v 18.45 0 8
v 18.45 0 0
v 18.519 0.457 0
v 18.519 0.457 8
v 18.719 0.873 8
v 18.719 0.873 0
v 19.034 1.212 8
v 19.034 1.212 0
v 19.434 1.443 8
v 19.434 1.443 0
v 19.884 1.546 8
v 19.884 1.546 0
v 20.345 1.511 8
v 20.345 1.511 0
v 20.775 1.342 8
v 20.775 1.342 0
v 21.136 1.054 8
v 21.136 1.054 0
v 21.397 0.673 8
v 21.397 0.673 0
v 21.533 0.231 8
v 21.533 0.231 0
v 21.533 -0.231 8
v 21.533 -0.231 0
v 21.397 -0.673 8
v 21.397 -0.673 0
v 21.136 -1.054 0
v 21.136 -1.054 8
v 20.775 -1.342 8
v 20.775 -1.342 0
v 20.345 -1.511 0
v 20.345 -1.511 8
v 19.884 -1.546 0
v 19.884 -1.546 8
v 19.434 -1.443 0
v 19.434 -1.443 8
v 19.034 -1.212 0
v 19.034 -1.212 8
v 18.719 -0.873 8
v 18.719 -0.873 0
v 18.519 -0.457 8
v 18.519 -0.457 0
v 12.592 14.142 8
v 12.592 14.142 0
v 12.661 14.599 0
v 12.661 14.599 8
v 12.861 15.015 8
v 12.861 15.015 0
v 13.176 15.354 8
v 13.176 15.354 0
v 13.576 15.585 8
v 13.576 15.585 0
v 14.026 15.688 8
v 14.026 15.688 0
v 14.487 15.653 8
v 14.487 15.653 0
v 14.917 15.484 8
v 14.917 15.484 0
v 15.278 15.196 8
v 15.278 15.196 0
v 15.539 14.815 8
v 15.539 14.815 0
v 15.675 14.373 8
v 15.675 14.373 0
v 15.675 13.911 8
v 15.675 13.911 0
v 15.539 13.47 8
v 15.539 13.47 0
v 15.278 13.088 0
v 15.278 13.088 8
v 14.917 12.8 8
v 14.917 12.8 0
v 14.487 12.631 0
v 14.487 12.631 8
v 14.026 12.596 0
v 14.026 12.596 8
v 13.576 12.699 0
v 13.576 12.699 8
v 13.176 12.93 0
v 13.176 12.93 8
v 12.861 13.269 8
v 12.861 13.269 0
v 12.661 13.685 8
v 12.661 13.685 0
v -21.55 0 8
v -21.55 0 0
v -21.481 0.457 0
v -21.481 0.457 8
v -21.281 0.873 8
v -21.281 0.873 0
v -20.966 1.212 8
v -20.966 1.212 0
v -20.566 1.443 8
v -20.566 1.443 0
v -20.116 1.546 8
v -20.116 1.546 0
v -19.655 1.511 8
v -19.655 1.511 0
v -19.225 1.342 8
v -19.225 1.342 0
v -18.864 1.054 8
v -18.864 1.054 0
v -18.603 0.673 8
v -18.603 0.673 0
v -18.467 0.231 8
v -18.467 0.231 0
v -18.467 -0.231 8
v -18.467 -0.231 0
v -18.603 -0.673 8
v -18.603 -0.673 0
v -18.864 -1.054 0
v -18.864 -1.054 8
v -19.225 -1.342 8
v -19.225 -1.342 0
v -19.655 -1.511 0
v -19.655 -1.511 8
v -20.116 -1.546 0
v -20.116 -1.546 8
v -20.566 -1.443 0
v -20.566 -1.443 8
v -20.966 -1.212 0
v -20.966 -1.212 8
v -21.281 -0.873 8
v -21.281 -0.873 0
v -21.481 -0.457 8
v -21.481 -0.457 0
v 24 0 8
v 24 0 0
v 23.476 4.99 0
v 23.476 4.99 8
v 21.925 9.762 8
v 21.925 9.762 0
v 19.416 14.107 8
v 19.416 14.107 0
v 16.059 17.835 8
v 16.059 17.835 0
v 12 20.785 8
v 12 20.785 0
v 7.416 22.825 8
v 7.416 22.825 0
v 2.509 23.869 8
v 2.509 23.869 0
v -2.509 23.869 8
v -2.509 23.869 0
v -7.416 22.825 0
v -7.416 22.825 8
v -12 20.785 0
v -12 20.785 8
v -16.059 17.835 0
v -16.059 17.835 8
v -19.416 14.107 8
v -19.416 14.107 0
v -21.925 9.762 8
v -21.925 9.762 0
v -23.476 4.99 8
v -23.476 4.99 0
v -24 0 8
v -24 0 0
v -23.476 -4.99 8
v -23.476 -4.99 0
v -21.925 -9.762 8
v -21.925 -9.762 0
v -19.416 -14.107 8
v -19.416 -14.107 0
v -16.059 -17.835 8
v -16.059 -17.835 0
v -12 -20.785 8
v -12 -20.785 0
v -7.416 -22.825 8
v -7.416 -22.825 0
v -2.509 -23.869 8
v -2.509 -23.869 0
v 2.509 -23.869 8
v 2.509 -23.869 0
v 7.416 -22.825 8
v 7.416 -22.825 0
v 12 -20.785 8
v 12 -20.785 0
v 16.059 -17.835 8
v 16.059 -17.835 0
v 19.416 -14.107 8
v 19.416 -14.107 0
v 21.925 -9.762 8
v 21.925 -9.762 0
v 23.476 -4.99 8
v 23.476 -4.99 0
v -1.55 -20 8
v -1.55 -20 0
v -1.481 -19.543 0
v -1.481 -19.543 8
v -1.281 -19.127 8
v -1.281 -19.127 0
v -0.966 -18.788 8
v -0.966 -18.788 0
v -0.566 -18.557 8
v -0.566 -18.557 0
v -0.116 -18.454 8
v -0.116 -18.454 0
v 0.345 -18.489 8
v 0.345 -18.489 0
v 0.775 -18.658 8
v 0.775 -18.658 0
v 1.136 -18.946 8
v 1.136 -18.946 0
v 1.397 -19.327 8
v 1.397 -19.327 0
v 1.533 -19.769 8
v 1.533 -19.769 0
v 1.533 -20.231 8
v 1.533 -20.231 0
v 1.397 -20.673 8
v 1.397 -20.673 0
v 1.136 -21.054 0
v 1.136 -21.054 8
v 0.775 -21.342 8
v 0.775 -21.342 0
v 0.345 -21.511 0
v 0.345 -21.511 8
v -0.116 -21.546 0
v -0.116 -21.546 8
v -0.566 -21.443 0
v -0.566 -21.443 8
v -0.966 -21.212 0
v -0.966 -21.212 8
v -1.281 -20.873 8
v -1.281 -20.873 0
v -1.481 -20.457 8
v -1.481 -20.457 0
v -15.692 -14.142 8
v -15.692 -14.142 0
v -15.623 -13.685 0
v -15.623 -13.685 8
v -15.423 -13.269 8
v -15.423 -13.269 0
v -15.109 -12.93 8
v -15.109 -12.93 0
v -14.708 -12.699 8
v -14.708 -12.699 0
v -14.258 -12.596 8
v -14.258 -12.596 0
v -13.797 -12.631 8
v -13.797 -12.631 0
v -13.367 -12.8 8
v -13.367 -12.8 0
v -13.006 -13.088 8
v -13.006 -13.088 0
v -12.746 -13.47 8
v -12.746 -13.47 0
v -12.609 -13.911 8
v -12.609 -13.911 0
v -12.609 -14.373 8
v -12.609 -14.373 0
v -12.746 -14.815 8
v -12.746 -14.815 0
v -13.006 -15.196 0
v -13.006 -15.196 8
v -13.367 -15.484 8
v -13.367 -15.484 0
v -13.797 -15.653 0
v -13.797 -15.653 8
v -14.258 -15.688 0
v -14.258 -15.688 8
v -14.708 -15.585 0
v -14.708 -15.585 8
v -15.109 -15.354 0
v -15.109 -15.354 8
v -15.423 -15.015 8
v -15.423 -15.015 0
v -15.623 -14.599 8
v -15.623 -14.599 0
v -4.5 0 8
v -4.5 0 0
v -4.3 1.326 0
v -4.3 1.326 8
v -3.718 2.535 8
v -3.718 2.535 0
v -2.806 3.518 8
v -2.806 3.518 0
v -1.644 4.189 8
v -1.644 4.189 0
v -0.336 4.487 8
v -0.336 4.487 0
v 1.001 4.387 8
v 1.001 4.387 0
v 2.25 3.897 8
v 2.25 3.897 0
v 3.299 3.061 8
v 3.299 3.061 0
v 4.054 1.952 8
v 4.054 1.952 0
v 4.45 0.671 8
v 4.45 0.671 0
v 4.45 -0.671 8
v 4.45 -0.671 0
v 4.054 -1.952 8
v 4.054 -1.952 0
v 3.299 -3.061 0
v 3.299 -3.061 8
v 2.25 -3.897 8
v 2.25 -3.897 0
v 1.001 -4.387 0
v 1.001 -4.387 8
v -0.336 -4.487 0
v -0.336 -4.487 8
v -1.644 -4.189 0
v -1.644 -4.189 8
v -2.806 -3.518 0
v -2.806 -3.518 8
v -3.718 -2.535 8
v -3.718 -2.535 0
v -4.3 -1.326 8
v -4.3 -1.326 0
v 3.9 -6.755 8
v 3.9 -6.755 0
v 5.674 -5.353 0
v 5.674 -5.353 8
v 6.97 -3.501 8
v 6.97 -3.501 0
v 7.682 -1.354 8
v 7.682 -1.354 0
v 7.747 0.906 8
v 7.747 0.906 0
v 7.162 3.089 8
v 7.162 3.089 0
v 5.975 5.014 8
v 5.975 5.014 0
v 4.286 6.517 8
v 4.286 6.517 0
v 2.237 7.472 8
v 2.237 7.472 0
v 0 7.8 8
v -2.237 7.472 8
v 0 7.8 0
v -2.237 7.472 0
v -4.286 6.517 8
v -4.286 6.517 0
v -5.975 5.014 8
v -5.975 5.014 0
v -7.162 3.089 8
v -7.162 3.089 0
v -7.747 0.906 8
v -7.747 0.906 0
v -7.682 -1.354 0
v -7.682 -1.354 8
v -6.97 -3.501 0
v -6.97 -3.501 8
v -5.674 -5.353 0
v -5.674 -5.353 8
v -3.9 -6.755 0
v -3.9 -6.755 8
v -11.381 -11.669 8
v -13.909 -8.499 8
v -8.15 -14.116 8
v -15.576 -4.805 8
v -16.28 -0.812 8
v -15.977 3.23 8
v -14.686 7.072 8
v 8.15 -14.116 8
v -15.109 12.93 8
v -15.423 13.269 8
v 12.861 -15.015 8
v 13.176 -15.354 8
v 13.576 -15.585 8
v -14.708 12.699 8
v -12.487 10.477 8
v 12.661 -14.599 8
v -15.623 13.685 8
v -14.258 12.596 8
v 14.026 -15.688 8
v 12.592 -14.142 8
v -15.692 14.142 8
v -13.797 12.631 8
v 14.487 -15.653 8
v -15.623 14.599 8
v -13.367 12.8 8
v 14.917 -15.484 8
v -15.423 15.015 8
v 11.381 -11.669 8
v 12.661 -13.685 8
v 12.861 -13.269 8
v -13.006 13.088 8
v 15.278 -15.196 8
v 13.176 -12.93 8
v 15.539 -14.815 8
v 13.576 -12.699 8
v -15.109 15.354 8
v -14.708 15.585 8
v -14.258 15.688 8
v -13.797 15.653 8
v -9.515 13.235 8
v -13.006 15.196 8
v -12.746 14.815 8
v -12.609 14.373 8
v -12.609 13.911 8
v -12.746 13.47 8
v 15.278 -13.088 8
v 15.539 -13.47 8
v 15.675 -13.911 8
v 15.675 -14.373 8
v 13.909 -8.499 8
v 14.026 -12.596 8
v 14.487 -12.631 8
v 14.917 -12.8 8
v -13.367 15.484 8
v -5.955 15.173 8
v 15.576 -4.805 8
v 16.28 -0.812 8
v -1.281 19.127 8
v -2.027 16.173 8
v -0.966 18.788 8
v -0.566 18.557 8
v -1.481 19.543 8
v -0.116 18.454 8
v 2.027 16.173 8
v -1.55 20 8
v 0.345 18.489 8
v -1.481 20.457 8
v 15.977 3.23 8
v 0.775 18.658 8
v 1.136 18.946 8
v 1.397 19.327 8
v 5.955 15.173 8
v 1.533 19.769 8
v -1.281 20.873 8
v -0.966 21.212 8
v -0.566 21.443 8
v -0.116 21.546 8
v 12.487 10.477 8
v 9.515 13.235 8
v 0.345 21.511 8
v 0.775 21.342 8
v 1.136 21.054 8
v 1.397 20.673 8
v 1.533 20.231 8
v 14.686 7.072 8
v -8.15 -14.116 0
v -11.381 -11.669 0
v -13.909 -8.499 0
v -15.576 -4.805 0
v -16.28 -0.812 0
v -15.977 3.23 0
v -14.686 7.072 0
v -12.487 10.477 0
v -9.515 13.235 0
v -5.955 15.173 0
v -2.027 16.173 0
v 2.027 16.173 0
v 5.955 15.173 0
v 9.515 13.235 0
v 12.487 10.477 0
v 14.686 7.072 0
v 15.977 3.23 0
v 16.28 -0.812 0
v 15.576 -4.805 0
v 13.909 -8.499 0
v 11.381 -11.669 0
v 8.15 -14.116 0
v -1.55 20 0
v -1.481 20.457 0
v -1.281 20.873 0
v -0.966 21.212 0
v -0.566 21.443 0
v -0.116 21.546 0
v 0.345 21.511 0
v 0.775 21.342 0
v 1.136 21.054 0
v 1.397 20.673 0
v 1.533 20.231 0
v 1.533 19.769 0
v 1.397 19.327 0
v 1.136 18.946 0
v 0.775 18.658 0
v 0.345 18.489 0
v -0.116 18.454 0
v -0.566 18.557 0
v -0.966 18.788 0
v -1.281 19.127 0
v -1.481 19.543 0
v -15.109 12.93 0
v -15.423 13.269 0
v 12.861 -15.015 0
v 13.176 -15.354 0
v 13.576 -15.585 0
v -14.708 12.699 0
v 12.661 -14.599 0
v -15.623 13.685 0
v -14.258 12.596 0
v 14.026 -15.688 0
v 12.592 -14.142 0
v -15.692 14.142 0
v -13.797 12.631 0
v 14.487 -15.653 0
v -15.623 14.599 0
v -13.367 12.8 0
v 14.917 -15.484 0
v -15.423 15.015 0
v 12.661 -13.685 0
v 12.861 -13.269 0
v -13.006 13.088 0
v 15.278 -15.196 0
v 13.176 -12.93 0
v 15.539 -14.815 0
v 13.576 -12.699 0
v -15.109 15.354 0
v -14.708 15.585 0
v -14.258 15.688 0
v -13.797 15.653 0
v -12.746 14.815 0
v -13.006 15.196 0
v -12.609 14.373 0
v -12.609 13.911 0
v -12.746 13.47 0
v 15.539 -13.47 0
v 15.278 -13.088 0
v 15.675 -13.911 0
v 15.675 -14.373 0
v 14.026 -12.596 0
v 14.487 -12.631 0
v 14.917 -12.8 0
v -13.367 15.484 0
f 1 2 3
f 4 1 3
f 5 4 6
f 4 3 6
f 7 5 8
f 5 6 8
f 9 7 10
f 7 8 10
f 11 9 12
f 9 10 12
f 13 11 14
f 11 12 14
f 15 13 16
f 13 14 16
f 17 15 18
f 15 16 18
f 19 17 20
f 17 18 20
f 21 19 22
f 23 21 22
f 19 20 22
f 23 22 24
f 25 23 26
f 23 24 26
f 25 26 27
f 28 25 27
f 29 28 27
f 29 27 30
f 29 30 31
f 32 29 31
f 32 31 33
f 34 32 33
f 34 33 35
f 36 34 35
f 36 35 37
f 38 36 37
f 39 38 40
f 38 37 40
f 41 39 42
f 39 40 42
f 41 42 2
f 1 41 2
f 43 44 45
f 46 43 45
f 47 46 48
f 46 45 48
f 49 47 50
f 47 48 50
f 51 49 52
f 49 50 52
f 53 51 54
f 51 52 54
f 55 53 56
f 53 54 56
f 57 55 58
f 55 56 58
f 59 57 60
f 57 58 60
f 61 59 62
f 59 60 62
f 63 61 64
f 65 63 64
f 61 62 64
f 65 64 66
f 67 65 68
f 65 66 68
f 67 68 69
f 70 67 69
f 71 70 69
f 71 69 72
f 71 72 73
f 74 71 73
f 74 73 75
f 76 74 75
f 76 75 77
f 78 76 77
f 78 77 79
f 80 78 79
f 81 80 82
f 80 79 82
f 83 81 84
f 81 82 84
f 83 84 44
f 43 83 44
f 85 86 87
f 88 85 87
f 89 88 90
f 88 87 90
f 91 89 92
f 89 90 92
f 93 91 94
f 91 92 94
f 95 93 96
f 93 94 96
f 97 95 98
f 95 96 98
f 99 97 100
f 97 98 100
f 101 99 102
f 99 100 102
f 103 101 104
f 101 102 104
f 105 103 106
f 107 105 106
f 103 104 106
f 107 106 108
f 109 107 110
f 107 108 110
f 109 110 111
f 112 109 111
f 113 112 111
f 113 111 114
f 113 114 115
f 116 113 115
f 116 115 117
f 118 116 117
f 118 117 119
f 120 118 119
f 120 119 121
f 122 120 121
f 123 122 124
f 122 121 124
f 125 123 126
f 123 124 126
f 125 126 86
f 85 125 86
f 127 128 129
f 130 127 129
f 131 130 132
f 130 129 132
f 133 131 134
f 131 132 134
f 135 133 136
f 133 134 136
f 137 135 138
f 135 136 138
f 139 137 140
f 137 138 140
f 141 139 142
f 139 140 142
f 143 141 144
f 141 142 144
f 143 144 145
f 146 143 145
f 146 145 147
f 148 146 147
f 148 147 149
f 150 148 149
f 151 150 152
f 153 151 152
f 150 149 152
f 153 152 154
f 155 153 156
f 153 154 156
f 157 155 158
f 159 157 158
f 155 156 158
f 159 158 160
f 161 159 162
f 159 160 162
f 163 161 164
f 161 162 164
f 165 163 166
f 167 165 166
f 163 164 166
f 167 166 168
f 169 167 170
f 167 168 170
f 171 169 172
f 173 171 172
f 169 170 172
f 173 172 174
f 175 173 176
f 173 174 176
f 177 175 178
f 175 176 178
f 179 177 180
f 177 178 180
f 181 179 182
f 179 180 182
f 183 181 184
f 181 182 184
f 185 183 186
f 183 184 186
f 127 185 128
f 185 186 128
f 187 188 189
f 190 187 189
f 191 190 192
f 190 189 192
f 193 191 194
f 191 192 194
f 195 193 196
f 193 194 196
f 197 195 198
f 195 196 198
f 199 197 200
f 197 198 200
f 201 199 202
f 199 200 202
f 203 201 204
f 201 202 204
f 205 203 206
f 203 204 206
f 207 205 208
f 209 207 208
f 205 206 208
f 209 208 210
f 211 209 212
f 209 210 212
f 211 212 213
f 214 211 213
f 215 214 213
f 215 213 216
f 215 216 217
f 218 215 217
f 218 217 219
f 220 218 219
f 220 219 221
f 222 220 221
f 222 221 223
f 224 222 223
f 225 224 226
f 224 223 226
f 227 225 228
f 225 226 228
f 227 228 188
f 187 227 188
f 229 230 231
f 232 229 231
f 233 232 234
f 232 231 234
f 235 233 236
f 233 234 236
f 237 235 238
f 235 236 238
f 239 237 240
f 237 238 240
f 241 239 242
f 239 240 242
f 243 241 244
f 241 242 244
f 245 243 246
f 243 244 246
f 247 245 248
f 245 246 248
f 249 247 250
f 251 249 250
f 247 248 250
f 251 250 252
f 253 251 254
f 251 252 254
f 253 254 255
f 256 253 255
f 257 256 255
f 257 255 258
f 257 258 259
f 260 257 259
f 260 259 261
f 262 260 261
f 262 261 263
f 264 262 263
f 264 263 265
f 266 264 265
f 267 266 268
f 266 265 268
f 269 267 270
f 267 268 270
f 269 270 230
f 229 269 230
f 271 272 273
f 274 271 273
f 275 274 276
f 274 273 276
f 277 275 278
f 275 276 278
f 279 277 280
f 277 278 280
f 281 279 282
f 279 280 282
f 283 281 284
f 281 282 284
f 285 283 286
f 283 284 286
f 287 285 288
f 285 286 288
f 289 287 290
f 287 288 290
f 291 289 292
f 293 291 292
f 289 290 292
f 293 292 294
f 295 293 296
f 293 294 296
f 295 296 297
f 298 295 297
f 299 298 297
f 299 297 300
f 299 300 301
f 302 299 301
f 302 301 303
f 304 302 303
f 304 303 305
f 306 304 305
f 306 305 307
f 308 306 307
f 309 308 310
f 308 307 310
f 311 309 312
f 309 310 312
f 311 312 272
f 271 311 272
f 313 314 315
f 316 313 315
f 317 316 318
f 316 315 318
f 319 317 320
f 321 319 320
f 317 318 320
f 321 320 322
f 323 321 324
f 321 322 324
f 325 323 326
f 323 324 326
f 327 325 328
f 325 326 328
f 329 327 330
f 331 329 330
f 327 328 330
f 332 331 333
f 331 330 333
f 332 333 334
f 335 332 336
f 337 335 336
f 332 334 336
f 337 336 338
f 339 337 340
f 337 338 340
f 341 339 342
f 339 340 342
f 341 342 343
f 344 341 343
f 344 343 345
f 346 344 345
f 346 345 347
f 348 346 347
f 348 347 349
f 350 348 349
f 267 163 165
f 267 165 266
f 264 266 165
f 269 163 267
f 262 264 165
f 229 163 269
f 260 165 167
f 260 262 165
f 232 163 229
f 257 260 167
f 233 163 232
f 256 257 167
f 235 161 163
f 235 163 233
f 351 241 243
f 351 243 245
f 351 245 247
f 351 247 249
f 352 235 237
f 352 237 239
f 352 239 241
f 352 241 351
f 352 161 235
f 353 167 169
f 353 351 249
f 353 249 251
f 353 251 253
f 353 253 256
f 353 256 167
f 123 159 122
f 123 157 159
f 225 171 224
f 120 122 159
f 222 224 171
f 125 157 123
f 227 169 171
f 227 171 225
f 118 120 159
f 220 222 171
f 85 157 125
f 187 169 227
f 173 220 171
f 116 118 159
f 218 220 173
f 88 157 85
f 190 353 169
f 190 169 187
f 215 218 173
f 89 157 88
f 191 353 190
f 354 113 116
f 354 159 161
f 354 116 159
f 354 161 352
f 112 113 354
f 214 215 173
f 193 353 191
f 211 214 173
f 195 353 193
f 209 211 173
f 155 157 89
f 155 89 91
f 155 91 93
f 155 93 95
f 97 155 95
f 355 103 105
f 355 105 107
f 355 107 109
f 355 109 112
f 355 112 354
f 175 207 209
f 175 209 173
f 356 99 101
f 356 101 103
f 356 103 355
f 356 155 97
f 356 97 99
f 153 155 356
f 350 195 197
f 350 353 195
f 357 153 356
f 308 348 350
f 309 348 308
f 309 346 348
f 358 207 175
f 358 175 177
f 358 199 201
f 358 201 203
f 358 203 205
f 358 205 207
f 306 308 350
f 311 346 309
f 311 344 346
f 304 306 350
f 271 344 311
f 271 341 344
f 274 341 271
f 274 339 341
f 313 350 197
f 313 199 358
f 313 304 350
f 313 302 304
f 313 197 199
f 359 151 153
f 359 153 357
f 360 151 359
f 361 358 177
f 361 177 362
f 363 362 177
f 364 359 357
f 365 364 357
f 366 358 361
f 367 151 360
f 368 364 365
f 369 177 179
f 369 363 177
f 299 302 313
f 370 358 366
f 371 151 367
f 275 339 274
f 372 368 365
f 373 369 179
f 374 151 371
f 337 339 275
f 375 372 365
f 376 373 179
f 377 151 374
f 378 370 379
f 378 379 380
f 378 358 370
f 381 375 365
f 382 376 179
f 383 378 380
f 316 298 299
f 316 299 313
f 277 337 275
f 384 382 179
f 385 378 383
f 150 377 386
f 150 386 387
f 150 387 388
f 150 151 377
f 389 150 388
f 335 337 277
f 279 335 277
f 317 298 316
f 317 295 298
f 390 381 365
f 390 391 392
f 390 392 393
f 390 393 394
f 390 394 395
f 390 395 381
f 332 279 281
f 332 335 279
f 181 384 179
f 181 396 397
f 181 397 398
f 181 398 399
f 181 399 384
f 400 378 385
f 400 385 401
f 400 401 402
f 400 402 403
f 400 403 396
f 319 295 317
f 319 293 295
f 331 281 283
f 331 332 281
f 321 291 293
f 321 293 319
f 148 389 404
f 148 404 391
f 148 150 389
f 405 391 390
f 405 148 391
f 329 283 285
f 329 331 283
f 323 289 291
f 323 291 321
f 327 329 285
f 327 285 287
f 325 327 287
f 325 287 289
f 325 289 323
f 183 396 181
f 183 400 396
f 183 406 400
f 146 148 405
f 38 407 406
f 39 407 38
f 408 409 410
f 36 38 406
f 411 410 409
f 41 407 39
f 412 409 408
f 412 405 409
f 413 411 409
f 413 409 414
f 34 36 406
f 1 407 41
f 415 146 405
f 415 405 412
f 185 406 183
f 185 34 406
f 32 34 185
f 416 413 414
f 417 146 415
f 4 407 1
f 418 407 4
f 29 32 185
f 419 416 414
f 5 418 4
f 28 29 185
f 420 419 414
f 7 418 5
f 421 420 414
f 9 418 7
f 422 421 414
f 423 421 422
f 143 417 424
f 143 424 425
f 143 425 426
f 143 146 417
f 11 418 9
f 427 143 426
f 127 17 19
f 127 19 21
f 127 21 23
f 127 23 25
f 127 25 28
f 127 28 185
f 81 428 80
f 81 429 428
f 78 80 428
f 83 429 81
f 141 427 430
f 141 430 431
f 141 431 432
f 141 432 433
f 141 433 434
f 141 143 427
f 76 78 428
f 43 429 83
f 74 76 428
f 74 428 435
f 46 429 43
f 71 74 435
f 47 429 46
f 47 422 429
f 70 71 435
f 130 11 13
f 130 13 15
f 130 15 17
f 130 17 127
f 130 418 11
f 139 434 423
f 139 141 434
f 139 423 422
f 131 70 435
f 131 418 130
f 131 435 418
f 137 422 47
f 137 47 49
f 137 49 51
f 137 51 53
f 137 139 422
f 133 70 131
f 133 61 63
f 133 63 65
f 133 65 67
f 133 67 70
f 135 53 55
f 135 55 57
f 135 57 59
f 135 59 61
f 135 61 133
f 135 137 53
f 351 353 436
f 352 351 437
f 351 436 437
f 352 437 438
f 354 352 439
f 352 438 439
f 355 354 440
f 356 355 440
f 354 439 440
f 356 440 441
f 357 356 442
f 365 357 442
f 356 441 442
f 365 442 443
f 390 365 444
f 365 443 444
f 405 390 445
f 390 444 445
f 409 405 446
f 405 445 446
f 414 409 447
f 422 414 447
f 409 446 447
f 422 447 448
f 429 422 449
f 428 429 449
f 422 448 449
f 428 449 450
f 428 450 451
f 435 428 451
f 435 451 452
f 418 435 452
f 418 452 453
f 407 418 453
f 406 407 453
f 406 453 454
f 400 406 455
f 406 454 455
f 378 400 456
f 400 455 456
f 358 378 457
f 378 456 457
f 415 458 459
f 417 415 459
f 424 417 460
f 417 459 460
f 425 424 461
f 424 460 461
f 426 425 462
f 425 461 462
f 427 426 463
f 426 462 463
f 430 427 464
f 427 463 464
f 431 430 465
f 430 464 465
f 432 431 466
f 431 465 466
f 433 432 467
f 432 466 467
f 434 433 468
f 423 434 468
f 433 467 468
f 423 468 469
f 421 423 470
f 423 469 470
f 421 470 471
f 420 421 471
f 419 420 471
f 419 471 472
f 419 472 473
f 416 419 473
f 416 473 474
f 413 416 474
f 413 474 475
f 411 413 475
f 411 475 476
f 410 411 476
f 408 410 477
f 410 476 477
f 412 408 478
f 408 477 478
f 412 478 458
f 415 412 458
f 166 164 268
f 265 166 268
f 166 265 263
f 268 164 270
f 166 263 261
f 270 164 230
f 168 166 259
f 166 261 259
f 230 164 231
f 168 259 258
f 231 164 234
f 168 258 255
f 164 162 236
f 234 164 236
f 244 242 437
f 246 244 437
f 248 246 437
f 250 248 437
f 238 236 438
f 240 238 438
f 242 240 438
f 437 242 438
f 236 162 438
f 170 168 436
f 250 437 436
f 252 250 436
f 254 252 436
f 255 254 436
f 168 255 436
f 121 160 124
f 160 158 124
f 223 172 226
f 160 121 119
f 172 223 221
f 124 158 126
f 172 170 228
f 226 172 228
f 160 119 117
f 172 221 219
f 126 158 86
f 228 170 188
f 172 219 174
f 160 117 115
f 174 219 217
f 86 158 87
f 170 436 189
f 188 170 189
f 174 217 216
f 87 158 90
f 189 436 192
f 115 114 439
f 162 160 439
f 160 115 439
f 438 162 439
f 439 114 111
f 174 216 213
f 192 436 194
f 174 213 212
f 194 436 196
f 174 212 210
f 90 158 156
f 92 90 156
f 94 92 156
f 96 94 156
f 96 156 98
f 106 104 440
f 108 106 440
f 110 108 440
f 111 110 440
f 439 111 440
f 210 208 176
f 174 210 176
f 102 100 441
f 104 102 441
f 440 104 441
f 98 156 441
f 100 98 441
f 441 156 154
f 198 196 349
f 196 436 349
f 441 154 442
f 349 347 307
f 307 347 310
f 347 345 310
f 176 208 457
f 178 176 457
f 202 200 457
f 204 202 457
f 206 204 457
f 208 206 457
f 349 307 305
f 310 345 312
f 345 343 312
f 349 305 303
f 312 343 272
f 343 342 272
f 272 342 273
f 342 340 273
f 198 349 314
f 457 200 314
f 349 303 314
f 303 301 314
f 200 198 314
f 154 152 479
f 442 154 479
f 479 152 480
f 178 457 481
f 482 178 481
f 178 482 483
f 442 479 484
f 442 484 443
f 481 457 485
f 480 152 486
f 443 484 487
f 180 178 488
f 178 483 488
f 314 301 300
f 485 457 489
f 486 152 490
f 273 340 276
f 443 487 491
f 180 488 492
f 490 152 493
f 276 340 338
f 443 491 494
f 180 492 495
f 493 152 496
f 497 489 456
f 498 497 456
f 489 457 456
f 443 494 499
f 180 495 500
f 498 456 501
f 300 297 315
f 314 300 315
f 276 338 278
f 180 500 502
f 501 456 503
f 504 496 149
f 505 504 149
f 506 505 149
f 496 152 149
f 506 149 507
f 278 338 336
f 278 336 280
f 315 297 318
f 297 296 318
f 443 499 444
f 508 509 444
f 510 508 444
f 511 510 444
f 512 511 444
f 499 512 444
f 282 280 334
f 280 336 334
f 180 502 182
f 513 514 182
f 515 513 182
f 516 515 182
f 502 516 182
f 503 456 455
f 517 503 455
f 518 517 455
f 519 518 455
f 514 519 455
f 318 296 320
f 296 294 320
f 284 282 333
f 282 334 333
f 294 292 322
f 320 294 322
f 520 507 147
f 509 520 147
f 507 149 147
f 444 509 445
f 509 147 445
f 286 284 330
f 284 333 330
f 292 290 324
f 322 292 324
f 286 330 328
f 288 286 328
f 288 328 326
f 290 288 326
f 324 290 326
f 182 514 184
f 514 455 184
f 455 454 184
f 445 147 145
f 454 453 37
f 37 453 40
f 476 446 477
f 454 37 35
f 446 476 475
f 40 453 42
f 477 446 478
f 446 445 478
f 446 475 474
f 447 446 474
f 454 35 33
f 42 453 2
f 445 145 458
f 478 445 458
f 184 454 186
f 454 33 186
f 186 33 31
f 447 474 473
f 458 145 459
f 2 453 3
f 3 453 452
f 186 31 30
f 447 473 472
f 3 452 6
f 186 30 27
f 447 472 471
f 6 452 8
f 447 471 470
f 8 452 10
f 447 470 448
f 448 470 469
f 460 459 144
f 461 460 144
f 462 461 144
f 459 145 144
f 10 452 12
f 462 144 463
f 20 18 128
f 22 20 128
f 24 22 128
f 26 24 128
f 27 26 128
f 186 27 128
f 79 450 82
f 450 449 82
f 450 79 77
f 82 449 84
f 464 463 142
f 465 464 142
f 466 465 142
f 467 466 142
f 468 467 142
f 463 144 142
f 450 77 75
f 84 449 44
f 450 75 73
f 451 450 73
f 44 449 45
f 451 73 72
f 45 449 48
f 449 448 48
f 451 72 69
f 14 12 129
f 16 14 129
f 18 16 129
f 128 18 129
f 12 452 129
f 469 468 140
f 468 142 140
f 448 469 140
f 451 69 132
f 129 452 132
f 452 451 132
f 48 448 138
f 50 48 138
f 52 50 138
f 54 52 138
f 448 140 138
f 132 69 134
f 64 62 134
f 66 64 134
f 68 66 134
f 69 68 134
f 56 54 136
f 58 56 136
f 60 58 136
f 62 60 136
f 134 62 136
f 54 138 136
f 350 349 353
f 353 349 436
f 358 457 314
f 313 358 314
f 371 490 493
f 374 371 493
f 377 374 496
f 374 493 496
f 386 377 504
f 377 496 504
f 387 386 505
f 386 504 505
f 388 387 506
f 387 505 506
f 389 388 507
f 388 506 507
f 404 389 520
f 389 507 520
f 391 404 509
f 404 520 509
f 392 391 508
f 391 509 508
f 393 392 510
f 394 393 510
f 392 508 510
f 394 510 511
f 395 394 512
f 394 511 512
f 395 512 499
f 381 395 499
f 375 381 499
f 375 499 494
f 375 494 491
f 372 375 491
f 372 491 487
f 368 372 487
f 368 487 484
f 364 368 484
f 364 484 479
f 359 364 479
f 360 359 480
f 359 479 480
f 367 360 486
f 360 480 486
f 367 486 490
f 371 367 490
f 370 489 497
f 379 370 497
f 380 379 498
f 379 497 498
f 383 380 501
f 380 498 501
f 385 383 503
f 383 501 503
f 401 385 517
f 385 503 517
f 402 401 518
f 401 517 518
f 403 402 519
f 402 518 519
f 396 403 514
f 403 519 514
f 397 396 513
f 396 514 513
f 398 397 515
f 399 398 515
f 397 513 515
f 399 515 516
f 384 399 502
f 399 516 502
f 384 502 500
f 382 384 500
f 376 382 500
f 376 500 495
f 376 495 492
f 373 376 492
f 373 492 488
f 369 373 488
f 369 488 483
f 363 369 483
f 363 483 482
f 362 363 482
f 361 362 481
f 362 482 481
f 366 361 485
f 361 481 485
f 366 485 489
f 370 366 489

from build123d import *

# Parameters (mm, degrees)
SKETCH6_R           = 24
BOSS_EXTRUDE1_DEPTH = 8
CUT_EXTRUDE4_DEPTH  = 8
SKETCH7_R           = 4.5
CUT_EXTRUDE5_DEPTH  = 8
SKETCH8_R           = 1.55
CUT_EXTRUDE6_DEPTH  = 8


with BuildPart() as part:
    # Sketch6 → Boss-Extrude1 (new body)
    with BuildSketch(Plane.XY):
        Circle(SKETCH6_R)
    extrude(amount=BOSS_EXTRUDE1_DEPTH)

    # Sketch4 → Cut-Extrude4 (cut)
    with BuildSketch(Plane.XY):
        with BuildLine():
            Line((-3.9, -6.75499815), (-8.15, -14.116214082))
            ThreePointArc((-8.15, -14.116214082), (0, 16.3), (8.15, -14.116214082))
            Line((8.15, -14.116214082), (3.9, -6.75499815))
            ThreePointArc((3.9, -6.75499815), (0, 7.8), (-3.9, -6.75499815))
        make_face()
    extrude(amount=CUT_EXTRUDE4_DEPTH, mode=Mode.SUBTRACT)

    # Sketch7 → Cut-Extrude5 (cut)
    with BuildSketch(Plane(origin=(0, 0, 0), x_dir=(-1, 0, 0), z_dir=(0, 0, -1))):
        Circle(SKETCH7_R)
    extrude(amount=-CUT_EXTRUDE5_DEPTH, mode=Mode.SUBTRACT)

    # Sketch8 → Cut-Extrude6 (cut)
    with BuildSketch(Plane(origin=(0, 0, 0), x_dir=(-1, 0, 0), z_dir=(0, 0, -1))):
        with Locations((0, 20)):
            Circle(SKETCH8_R)
        with Locations((14.142135624, 14.142135624)):
            Circle(SKETCH8_R)
        with Locations((20, 0)):
            Circle(SKETCH8_R)
        with Locations((14.142135624, -14.142135624)):
            Circle(SKETCH8_R)
        with Locations((0, -20)):
            Circle(SKETCH8_R)
        with Locations((-14.142135624, -14.142135624)):
            Circle(SKETCH8_R)
        with Locations((-20, 0)):
            Circle(SKETCH8_R)
        with Locations((-14.142135624, 14.142135624)):
            Circle(SKETCH8_R)
    extrude(amount=-CUT_EXTRUDE6_DEPTH, mode=Mode.SUBTRACT)


solid = part.part
